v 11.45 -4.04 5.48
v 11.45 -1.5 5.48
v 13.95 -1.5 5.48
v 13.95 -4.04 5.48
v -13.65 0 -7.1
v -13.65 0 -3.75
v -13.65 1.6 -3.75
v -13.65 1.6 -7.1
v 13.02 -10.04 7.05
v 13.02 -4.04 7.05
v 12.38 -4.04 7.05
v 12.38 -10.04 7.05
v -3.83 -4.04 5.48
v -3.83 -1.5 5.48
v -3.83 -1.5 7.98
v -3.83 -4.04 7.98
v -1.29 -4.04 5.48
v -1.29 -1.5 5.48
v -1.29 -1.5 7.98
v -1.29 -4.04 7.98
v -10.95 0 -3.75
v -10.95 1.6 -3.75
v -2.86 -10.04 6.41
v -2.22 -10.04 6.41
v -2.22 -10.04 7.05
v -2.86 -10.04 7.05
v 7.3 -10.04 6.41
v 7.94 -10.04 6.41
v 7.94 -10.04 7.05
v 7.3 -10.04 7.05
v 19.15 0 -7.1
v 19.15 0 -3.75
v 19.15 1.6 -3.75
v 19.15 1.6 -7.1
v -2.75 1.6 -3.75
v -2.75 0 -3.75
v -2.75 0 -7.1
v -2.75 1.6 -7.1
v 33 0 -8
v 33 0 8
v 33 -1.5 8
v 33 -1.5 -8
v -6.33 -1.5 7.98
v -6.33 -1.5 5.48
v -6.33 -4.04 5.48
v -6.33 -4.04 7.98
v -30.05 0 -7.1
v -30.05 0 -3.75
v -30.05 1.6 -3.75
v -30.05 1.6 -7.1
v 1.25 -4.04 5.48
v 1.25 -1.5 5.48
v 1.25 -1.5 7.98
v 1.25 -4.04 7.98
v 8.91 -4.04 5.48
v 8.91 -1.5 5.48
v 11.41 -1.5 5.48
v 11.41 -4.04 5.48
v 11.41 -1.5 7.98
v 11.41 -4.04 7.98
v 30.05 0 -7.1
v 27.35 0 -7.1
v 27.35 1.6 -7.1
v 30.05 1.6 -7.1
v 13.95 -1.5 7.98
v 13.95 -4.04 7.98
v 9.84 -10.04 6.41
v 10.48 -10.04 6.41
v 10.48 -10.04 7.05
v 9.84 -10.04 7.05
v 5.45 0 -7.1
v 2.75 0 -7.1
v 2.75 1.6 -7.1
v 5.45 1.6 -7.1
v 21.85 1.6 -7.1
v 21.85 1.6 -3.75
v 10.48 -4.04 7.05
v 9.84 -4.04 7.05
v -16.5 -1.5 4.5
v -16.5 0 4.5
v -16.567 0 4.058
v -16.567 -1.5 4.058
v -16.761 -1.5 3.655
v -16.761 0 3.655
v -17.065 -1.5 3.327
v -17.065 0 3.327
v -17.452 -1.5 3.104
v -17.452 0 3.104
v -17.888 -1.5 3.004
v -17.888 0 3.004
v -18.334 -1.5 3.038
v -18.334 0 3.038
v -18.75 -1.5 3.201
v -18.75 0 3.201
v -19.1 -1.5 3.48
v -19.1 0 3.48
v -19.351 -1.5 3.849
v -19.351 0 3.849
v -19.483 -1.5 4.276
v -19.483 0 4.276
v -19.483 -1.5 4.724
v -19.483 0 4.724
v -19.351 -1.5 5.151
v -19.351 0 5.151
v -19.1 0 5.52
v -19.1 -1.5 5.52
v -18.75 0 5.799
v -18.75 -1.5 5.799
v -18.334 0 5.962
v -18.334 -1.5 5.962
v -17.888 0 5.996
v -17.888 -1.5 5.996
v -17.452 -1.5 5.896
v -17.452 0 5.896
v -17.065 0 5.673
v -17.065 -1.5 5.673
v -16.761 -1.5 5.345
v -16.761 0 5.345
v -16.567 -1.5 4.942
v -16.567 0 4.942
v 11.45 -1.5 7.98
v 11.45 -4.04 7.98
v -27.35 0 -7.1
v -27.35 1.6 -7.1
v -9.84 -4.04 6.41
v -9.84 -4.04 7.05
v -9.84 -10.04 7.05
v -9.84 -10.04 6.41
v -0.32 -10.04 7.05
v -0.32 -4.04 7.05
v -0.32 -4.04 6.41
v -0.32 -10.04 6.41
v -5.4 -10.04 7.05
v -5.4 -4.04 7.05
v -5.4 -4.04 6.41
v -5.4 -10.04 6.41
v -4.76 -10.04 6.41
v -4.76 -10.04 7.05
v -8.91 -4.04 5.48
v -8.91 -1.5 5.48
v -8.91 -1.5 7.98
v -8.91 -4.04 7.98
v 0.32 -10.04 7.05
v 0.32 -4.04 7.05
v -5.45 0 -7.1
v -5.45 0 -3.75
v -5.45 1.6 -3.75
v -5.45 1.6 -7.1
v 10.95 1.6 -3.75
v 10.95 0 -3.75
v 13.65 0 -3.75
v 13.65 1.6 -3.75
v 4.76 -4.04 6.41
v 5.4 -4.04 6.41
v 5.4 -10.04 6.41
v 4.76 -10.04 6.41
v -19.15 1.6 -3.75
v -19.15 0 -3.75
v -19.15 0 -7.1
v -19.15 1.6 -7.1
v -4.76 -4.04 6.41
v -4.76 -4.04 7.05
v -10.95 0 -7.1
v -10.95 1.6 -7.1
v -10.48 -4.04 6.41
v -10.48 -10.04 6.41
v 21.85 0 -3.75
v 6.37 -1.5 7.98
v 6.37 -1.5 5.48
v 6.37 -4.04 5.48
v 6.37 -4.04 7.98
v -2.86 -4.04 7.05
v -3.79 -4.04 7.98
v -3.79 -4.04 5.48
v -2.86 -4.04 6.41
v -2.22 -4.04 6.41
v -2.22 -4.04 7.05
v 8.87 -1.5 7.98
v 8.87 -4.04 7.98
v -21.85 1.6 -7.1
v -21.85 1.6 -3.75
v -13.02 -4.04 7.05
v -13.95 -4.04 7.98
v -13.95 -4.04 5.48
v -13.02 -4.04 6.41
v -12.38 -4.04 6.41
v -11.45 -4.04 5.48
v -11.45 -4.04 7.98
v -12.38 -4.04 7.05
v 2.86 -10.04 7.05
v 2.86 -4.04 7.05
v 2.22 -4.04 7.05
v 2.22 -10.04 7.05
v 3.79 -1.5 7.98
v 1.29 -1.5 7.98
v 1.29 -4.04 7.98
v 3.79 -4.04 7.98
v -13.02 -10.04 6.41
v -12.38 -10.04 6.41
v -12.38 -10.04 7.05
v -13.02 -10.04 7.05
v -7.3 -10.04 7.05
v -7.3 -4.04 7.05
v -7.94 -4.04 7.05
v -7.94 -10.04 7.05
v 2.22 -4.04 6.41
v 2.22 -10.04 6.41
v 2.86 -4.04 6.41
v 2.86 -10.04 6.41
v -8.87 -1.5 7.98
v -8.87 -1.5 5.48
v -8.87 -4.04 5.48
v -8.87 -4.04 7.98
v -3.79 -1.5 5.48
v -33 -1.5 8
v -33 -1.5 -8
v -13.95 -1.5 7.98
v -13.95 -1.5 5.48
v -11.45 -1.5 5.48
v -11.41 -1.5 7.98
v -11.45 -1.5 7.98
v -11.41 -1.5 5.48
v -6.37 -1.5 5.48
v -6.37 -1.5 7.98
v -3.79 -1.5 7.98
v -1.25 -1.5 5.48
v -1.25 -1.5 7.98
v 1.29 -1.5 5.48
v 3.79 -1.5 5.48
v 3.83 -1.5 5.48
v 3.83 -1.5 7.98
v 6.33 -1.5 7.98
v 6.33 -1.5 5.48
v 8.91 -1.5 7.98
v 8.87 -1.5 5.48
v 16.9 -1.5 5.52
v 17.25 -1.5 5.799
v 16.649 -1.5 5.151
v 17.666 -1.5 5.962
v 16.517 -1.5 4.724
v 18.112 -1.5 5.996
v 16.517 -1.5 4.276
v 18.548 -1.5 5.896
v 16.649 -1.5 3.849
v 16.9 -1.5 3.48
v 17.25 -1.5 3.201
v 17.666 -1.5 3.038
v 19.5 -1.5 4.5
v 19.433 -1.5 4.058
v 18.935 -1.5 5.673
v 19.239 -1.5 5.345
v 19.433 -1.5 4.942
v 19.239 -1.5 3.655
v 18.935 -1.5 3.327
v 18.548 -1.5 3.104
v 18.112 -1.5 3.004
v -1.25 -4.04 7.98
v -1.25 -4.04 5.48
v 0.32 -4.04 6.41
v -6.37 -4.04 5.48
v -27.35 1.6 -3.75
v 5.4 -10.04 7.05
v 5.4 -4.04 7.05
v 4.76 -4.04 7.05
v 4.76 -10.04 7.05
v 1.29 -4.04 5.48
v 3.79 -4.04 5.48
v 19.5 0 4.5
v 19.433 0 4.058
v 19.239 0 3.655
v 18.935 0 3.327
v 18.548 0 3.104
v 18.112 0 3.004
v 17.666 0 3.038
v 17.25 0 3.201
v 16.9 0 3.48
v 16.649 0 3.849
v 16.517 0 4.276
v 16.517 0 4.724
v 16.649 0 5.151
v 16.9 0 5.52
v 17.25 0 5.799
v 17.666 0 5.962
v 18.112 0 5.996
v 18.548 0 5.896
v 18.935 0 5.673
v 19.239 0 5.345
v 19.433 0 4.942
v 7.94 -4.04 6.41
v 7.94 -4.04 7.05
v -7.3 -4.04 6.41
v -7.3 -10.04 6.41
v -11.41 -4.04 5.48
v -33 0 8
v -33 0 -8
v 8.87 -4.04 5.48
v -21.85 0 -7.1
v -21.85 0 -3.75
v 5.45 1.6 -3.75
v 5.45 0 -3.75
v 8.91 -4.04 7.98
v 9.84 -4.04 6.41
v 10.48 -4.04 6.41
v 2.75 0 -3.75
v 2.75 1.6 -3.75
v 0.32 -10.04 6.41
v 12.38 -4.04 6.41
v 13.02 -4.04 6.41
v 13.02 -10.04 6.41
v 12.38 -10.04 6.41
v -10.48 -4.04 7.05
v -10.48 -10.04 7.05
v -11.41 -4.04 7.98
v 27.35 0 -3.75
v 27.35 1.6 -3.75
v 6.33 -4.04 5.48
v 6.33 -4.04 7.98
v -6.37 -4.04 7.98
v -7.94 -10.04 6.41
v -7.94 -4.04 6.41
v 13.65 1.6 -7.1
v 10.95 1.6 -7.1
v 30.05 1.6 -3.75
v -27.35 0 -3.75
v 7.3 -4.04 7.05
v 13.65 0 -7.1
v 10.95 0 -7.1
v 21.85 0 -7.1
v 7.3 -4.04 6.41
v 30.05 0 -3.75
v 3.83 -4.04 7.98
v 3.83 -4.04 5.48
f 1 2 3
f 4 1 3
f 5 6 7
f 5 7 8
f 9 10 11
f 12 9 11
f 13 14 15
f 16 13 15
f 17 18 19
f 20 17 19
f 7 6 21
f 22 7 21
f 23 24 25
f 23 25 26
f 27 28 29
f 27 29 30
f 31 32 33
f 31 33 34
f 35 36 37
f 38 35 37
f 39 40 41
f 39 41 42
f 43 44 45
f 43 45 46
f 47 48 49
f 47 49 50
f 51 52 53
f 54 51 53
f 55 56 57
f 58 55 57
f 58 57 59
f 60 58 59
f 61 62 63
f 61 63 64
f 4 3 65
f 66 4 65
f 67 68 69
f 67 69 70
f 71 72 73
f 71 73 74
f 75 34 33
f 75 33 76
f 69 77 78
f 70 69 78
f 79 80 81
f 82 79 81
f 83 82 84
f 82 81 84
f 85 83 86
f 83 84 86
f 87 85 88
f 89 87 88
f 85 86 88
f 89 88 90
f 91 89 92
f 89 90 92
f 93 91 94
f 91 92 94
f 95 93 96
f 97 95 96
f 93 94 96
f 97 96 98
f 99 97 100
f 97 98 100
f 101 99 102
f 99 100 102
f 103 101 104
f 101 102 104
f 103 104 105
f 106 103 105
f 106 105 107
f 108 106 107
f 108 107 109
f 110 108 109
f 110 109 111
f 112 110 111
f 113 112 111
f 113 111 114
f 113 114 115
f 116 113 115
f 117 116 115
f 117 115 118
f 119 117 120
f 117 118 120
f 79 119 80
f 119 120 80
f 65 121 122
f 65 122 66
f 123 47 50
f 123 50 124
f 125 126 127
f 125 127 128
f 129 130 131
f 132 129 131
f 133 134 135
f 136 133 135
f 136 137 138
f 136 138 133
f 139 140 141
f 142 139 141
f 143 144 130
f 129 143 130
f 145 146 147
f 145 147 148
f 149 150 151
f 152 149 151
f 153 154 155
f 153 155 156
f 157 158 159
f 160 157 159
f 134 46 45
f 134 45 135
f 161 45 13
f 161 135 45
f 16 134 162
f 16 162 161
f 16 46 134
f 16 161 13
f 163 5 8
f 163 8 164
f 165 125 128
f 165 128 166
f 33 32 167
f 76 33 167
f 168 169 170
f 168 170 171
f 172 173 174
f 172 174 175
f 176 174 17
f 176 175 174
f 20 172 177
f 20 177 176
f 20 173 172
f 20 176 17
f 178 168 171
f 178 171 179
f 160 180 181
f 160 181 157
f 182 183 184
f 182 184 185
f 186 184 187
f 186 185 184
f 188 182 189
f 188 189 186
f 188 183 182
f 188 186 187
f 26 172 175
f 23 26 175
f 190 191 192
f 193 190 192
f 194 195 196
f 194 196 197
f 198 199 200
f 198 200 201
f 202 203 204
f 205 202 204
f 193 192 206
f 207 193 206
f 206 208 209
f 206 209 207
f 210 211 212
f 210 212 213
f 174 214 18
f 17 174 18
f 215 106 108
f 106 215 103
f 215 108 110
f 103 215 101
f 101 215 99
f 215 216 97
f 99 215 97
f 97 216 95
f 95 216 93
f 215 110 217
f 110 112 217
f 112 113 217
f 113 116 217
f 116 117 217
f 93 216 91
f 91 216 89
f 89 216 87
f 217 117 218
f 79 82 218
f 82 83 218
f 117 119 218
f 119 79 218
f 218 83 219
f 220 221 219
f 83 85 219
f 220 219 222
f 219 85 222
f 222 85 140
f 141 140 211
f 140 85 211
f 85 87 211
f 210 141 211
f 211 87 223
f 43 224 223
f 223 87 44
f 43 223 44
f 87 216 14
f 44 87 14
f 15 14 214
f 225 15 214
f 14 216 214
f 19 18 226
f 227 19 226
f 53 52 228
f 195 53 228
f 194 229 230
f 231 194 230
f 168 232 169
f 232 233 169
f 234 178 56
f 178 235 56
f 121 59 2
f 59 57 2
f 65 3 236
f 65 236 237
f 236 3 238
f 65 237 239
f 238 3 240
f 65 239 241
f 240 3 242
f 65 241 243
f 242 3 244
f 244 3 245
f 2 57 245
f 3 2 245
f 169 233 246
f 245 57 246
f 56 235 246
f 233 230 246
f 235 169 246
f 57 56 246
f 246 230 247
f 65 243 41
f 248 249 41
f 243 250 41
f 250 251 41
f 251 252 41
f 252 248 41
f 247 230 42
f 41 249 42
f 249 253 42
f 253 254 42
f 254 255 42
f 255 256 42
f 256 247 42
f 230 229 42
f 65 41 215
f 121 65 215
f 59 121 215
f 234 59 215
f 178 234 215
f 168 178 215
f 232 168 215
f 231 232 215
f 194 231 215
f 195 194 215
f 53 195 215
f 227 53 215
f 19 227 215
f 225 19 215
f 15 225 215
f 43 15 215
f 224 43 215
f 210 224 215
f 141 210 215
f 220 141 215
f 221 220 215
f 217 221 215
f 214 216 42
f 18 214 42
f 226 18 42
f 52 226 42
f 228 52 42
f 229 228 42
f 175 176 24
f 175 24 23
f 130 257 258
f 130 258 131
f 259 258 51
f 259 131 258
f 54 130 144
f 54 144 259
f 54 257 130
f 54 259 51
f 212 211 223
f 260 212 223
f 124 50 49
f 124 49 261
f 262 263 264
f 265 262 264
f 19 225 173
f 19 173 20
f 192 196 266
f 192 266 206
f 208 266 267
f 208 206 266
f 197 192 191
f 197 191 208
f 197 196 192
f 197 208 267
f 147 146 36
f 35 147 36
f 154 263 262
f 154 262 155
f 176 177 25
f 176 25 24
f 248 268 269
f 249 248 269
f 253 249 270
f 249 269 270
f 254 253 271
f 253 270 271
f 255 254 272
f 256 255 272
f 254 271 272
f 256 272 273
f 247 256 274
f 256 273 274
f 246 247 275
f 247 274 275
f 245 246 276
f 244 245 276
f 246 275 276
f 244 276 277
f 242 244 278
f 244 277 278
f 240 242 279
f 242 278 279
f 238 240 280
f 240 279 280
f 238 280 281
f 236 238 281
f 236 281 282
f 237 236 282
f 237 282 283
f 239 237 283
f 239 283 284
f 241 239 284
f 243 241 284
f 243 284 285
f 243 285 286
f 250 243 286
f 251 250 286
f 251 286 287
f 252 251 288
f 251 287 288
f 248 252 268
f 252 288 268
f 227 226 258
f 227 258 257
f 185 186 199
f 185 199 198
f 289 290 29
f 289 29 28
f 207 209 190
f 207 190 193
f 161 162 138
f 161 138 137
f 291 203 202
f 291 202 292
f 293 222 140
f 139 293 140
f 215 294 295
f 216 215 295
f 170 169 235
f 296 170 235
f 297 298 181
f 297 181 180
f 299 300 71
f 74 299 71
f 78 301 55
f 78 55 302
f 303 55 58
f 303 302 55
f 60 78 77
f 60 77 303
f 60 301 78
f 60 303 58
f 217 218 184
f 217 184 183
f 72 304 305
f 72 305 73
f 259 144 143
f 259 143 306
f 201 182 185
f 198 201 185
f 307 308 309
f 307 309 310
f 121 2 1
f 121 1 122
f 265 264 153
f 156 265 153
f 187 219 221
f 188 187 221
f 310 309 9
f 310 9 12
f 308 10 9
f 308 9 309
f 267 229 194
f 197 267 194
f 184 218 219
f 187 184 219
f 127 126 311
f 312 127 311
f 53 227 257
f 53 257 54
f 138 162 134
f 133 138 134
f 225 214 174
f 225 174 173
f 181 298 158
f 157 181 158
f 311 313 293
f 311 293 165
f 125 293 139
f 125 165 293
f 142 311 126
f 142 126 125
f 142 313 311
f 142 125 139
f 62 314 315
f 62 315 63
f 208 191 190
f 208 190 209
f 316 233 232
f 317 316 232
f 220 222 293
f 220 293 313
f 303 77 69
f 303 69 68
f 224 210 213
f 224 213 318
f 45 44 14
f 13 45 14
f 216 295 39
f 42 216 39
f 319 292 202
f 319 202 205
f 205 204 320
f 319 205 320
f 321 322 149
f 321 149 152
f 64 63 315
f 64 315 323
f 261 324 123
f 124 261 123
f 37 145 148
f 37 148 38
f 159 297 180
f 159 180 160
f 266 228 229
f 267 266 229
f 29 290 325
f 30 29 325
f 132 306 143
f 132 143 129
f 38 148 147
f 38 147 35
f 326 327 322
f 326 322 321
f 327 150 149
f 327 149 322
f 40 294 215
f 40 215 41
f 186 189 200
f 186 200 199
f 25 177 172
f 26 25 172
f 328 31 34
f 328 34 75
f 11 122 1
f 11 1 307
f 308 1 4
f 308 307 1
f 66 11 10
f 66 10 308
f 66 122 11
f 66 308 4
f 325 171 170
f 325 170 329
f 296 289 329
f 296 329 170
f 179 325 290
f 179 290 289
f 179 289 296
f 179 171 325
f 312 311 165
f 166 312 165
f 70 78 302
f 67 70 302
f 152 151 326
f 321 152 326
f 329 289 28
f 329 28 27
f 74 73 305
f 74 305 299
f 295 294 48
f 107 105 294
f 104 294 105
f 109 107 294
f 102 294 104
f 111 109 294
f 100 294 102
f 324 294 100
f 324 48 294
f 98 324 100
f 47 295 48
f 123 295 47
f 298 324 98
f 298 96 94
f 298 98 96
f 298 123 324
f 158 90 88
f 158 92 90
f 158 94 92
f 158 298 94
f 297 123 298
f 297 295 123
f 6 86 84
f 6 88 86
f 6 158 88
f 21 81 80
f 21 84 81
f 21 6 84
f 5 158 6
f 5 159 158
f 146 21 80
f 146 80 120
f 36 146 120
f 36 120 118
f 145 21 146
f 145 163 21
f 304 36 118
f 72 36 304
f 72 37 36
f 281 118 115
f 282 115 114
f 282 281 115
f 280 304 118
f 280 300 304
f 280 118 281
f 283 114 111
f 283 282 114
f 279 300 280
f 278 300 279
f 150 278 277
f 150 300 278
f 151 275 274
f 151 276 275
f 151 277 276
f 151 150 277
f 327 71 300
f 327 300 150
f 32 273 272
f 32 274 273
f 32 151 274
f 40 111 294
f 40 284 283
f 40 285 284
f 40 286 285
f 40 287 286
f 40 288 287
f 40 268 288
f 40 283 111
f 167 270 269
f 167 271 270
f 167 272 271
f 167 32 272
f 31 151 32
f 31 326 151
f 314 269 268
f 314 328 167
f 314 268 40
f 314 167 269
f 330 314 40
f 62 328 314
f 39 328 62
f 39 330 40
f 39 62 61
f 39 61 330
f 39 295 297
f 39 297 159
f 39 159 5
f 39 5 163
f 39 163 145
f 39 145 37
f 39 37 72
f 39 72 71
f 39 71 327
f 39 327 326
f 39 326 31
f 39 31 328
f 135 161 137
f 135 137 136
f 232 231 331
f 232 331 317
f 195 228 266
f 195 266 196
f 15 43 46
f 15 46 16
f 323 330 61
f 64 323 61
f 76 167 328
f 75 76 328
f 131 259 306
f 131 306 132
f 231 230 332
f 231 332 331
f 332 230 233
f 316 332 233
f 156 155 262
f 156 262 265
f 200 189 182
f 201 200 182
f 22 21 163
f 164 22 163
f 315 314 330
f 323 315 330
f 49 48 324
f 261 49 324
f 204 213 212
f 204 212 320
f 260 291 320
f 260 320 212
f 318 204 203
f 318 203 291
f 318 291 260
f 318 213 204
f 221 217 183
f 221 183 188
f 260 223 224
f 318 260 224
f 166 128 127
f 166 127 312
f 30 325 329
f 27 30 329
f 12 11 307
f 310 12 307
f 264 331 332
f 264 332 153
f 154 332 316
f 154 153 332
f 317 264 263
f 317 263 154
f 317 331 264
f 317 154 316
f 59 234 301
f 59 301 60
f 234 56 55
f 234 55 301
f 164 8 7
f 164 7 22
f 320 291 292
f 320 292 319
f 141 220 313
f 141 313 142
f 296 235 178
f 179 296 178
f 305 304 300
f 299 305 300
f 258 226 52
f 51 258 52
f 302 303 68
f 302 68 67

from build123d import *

# Parameters (mm, degrees)
SKETCH1_W           = 66
SKETCH1_H           = 16
SKETCH1_R           = 1.5
BOSS_EXTRUDE1_DEPTH = 1.5
SKETCH2_W           = 2.5
SKETCH2_H           = 2.5
BOSS_EXTRUDE2_DEPTH = 2.54
SKETCH3_W           = 0.64
SKETCH3_H           = 0.64
BOSS_EXTRUDE3_DEPTH = 6
LPATTERN1_COUNT     = 6
LPATTERN1_PITCH     = 2.54
LPATTERN1_COL_COUNT = 6
LPATTERN1_COL_PITCH = 2.54
SKETCH4_W           = 2.7
SKETCH4_H           = 3.35
BOSS_EXTRUDE4_DEPTH = 1.6


with BuildPart() as part:
    # Sketch1 → Boss-Extrude1 (new body)
    with BuildSketch(Plane(origin=(0, 0, 0), x_dir=(1, 0, 0), z_dir=(0, 1, 0))):
        Rectangle(SKETCH1_W, SKETCH1_H)
        with Locations((-18, -4.5)):
            Circle(SKETCH1_R, mode=Mode.SUBTRACT)
        with Locations((18, -4.5)):
            Circle(SKETCH1_R, mode=Mode.SUBTRACT)
    extrude(amount=-BOSS_EXTRUDE1_DEPTH)

    # Sketch2 → Boss-Extrude2 (add)
    with BuildSketch(Plane.XZ.offset(1.5)):
        with Locations((0, 6.73)):
            Rectangle(SKETCH2_W, SKETCH2_H)
    boss_extrude2 = extrude(amount=BOSS_EXTRUDE2_DEPTH)

    # Sketch3 → Boss-Extrude3 (add)
    with BuildSketch(Plane(origin=(0, -4.04, 0), x_dir=(-1, 0, 0), z_dir=(0, -1, 0))):
        with Locations((0, -6.73)):
            Rectangle(SKETCH3_W, SKETCH3_H)
    boss_extrude3 = extrude(amount=BOSS_EXTRUDE3_DEPTH)

    # LPattern1: Boss-Extrude2, Boss-Extrude3 ×6
    with Locations(*[(-i * LPATTERN1_PITCH, 0, 0) for i in range(1, LPATTERN1_COUNT)]):
        add(boss_extrude2)
        add(boss_extrude3)

    # LPattern1 col: Boss-Extrude2, Boss-Extrude3 ×6
    with Locations(*[(i * LPATTERN1_COL_PITCH, 0, 0) for i in range(1, LPATTERN1_COL_COUNT)]):
        add(boss_extrude2)
        add(boss_extrude3)

    # Sketch4 → Boss-Extrude4 (add)
    with BuildSketch(Plane(origin=(0, 0, 0), x_dir=(1, 0, 0), z_dir=(0, 1, 0))):
        with Locations((-4.1, 5.425)):
            Rectangle(SKETCH4_W, SKETCH4_H)
        with Locations((4.1, 5.425)):
            Rectangle(SKETCH4_W, SKETCH4_H)
        with Locations((12.3, 5.425)):
            Rectangle(SKETCH4_W, SKETCH4_H)
        with Locations((20.5, 5.425)):
            Rectangle(SKETCH4_W, SKETCH4_H)
        with Locations((28.7, 5.425)):
            Rectangle(SKETCH4_W, SKETCH4_H)
        with Locations((-12.3, 5.425)):
            Rectangle(SKETCH4_W, SKETCH4_H)
        with Locations((-28.7, 5.425)):
            Rectangle(SKETCH4_W, SKETCH4_H)
        with Locations((-20.5, 5.425)):
            Rectangle(SKETCH4_W, SKETCH4_H)
    extrude(amount=BOSS_EXTRUDE4_DEPTH)


solid = part.part
